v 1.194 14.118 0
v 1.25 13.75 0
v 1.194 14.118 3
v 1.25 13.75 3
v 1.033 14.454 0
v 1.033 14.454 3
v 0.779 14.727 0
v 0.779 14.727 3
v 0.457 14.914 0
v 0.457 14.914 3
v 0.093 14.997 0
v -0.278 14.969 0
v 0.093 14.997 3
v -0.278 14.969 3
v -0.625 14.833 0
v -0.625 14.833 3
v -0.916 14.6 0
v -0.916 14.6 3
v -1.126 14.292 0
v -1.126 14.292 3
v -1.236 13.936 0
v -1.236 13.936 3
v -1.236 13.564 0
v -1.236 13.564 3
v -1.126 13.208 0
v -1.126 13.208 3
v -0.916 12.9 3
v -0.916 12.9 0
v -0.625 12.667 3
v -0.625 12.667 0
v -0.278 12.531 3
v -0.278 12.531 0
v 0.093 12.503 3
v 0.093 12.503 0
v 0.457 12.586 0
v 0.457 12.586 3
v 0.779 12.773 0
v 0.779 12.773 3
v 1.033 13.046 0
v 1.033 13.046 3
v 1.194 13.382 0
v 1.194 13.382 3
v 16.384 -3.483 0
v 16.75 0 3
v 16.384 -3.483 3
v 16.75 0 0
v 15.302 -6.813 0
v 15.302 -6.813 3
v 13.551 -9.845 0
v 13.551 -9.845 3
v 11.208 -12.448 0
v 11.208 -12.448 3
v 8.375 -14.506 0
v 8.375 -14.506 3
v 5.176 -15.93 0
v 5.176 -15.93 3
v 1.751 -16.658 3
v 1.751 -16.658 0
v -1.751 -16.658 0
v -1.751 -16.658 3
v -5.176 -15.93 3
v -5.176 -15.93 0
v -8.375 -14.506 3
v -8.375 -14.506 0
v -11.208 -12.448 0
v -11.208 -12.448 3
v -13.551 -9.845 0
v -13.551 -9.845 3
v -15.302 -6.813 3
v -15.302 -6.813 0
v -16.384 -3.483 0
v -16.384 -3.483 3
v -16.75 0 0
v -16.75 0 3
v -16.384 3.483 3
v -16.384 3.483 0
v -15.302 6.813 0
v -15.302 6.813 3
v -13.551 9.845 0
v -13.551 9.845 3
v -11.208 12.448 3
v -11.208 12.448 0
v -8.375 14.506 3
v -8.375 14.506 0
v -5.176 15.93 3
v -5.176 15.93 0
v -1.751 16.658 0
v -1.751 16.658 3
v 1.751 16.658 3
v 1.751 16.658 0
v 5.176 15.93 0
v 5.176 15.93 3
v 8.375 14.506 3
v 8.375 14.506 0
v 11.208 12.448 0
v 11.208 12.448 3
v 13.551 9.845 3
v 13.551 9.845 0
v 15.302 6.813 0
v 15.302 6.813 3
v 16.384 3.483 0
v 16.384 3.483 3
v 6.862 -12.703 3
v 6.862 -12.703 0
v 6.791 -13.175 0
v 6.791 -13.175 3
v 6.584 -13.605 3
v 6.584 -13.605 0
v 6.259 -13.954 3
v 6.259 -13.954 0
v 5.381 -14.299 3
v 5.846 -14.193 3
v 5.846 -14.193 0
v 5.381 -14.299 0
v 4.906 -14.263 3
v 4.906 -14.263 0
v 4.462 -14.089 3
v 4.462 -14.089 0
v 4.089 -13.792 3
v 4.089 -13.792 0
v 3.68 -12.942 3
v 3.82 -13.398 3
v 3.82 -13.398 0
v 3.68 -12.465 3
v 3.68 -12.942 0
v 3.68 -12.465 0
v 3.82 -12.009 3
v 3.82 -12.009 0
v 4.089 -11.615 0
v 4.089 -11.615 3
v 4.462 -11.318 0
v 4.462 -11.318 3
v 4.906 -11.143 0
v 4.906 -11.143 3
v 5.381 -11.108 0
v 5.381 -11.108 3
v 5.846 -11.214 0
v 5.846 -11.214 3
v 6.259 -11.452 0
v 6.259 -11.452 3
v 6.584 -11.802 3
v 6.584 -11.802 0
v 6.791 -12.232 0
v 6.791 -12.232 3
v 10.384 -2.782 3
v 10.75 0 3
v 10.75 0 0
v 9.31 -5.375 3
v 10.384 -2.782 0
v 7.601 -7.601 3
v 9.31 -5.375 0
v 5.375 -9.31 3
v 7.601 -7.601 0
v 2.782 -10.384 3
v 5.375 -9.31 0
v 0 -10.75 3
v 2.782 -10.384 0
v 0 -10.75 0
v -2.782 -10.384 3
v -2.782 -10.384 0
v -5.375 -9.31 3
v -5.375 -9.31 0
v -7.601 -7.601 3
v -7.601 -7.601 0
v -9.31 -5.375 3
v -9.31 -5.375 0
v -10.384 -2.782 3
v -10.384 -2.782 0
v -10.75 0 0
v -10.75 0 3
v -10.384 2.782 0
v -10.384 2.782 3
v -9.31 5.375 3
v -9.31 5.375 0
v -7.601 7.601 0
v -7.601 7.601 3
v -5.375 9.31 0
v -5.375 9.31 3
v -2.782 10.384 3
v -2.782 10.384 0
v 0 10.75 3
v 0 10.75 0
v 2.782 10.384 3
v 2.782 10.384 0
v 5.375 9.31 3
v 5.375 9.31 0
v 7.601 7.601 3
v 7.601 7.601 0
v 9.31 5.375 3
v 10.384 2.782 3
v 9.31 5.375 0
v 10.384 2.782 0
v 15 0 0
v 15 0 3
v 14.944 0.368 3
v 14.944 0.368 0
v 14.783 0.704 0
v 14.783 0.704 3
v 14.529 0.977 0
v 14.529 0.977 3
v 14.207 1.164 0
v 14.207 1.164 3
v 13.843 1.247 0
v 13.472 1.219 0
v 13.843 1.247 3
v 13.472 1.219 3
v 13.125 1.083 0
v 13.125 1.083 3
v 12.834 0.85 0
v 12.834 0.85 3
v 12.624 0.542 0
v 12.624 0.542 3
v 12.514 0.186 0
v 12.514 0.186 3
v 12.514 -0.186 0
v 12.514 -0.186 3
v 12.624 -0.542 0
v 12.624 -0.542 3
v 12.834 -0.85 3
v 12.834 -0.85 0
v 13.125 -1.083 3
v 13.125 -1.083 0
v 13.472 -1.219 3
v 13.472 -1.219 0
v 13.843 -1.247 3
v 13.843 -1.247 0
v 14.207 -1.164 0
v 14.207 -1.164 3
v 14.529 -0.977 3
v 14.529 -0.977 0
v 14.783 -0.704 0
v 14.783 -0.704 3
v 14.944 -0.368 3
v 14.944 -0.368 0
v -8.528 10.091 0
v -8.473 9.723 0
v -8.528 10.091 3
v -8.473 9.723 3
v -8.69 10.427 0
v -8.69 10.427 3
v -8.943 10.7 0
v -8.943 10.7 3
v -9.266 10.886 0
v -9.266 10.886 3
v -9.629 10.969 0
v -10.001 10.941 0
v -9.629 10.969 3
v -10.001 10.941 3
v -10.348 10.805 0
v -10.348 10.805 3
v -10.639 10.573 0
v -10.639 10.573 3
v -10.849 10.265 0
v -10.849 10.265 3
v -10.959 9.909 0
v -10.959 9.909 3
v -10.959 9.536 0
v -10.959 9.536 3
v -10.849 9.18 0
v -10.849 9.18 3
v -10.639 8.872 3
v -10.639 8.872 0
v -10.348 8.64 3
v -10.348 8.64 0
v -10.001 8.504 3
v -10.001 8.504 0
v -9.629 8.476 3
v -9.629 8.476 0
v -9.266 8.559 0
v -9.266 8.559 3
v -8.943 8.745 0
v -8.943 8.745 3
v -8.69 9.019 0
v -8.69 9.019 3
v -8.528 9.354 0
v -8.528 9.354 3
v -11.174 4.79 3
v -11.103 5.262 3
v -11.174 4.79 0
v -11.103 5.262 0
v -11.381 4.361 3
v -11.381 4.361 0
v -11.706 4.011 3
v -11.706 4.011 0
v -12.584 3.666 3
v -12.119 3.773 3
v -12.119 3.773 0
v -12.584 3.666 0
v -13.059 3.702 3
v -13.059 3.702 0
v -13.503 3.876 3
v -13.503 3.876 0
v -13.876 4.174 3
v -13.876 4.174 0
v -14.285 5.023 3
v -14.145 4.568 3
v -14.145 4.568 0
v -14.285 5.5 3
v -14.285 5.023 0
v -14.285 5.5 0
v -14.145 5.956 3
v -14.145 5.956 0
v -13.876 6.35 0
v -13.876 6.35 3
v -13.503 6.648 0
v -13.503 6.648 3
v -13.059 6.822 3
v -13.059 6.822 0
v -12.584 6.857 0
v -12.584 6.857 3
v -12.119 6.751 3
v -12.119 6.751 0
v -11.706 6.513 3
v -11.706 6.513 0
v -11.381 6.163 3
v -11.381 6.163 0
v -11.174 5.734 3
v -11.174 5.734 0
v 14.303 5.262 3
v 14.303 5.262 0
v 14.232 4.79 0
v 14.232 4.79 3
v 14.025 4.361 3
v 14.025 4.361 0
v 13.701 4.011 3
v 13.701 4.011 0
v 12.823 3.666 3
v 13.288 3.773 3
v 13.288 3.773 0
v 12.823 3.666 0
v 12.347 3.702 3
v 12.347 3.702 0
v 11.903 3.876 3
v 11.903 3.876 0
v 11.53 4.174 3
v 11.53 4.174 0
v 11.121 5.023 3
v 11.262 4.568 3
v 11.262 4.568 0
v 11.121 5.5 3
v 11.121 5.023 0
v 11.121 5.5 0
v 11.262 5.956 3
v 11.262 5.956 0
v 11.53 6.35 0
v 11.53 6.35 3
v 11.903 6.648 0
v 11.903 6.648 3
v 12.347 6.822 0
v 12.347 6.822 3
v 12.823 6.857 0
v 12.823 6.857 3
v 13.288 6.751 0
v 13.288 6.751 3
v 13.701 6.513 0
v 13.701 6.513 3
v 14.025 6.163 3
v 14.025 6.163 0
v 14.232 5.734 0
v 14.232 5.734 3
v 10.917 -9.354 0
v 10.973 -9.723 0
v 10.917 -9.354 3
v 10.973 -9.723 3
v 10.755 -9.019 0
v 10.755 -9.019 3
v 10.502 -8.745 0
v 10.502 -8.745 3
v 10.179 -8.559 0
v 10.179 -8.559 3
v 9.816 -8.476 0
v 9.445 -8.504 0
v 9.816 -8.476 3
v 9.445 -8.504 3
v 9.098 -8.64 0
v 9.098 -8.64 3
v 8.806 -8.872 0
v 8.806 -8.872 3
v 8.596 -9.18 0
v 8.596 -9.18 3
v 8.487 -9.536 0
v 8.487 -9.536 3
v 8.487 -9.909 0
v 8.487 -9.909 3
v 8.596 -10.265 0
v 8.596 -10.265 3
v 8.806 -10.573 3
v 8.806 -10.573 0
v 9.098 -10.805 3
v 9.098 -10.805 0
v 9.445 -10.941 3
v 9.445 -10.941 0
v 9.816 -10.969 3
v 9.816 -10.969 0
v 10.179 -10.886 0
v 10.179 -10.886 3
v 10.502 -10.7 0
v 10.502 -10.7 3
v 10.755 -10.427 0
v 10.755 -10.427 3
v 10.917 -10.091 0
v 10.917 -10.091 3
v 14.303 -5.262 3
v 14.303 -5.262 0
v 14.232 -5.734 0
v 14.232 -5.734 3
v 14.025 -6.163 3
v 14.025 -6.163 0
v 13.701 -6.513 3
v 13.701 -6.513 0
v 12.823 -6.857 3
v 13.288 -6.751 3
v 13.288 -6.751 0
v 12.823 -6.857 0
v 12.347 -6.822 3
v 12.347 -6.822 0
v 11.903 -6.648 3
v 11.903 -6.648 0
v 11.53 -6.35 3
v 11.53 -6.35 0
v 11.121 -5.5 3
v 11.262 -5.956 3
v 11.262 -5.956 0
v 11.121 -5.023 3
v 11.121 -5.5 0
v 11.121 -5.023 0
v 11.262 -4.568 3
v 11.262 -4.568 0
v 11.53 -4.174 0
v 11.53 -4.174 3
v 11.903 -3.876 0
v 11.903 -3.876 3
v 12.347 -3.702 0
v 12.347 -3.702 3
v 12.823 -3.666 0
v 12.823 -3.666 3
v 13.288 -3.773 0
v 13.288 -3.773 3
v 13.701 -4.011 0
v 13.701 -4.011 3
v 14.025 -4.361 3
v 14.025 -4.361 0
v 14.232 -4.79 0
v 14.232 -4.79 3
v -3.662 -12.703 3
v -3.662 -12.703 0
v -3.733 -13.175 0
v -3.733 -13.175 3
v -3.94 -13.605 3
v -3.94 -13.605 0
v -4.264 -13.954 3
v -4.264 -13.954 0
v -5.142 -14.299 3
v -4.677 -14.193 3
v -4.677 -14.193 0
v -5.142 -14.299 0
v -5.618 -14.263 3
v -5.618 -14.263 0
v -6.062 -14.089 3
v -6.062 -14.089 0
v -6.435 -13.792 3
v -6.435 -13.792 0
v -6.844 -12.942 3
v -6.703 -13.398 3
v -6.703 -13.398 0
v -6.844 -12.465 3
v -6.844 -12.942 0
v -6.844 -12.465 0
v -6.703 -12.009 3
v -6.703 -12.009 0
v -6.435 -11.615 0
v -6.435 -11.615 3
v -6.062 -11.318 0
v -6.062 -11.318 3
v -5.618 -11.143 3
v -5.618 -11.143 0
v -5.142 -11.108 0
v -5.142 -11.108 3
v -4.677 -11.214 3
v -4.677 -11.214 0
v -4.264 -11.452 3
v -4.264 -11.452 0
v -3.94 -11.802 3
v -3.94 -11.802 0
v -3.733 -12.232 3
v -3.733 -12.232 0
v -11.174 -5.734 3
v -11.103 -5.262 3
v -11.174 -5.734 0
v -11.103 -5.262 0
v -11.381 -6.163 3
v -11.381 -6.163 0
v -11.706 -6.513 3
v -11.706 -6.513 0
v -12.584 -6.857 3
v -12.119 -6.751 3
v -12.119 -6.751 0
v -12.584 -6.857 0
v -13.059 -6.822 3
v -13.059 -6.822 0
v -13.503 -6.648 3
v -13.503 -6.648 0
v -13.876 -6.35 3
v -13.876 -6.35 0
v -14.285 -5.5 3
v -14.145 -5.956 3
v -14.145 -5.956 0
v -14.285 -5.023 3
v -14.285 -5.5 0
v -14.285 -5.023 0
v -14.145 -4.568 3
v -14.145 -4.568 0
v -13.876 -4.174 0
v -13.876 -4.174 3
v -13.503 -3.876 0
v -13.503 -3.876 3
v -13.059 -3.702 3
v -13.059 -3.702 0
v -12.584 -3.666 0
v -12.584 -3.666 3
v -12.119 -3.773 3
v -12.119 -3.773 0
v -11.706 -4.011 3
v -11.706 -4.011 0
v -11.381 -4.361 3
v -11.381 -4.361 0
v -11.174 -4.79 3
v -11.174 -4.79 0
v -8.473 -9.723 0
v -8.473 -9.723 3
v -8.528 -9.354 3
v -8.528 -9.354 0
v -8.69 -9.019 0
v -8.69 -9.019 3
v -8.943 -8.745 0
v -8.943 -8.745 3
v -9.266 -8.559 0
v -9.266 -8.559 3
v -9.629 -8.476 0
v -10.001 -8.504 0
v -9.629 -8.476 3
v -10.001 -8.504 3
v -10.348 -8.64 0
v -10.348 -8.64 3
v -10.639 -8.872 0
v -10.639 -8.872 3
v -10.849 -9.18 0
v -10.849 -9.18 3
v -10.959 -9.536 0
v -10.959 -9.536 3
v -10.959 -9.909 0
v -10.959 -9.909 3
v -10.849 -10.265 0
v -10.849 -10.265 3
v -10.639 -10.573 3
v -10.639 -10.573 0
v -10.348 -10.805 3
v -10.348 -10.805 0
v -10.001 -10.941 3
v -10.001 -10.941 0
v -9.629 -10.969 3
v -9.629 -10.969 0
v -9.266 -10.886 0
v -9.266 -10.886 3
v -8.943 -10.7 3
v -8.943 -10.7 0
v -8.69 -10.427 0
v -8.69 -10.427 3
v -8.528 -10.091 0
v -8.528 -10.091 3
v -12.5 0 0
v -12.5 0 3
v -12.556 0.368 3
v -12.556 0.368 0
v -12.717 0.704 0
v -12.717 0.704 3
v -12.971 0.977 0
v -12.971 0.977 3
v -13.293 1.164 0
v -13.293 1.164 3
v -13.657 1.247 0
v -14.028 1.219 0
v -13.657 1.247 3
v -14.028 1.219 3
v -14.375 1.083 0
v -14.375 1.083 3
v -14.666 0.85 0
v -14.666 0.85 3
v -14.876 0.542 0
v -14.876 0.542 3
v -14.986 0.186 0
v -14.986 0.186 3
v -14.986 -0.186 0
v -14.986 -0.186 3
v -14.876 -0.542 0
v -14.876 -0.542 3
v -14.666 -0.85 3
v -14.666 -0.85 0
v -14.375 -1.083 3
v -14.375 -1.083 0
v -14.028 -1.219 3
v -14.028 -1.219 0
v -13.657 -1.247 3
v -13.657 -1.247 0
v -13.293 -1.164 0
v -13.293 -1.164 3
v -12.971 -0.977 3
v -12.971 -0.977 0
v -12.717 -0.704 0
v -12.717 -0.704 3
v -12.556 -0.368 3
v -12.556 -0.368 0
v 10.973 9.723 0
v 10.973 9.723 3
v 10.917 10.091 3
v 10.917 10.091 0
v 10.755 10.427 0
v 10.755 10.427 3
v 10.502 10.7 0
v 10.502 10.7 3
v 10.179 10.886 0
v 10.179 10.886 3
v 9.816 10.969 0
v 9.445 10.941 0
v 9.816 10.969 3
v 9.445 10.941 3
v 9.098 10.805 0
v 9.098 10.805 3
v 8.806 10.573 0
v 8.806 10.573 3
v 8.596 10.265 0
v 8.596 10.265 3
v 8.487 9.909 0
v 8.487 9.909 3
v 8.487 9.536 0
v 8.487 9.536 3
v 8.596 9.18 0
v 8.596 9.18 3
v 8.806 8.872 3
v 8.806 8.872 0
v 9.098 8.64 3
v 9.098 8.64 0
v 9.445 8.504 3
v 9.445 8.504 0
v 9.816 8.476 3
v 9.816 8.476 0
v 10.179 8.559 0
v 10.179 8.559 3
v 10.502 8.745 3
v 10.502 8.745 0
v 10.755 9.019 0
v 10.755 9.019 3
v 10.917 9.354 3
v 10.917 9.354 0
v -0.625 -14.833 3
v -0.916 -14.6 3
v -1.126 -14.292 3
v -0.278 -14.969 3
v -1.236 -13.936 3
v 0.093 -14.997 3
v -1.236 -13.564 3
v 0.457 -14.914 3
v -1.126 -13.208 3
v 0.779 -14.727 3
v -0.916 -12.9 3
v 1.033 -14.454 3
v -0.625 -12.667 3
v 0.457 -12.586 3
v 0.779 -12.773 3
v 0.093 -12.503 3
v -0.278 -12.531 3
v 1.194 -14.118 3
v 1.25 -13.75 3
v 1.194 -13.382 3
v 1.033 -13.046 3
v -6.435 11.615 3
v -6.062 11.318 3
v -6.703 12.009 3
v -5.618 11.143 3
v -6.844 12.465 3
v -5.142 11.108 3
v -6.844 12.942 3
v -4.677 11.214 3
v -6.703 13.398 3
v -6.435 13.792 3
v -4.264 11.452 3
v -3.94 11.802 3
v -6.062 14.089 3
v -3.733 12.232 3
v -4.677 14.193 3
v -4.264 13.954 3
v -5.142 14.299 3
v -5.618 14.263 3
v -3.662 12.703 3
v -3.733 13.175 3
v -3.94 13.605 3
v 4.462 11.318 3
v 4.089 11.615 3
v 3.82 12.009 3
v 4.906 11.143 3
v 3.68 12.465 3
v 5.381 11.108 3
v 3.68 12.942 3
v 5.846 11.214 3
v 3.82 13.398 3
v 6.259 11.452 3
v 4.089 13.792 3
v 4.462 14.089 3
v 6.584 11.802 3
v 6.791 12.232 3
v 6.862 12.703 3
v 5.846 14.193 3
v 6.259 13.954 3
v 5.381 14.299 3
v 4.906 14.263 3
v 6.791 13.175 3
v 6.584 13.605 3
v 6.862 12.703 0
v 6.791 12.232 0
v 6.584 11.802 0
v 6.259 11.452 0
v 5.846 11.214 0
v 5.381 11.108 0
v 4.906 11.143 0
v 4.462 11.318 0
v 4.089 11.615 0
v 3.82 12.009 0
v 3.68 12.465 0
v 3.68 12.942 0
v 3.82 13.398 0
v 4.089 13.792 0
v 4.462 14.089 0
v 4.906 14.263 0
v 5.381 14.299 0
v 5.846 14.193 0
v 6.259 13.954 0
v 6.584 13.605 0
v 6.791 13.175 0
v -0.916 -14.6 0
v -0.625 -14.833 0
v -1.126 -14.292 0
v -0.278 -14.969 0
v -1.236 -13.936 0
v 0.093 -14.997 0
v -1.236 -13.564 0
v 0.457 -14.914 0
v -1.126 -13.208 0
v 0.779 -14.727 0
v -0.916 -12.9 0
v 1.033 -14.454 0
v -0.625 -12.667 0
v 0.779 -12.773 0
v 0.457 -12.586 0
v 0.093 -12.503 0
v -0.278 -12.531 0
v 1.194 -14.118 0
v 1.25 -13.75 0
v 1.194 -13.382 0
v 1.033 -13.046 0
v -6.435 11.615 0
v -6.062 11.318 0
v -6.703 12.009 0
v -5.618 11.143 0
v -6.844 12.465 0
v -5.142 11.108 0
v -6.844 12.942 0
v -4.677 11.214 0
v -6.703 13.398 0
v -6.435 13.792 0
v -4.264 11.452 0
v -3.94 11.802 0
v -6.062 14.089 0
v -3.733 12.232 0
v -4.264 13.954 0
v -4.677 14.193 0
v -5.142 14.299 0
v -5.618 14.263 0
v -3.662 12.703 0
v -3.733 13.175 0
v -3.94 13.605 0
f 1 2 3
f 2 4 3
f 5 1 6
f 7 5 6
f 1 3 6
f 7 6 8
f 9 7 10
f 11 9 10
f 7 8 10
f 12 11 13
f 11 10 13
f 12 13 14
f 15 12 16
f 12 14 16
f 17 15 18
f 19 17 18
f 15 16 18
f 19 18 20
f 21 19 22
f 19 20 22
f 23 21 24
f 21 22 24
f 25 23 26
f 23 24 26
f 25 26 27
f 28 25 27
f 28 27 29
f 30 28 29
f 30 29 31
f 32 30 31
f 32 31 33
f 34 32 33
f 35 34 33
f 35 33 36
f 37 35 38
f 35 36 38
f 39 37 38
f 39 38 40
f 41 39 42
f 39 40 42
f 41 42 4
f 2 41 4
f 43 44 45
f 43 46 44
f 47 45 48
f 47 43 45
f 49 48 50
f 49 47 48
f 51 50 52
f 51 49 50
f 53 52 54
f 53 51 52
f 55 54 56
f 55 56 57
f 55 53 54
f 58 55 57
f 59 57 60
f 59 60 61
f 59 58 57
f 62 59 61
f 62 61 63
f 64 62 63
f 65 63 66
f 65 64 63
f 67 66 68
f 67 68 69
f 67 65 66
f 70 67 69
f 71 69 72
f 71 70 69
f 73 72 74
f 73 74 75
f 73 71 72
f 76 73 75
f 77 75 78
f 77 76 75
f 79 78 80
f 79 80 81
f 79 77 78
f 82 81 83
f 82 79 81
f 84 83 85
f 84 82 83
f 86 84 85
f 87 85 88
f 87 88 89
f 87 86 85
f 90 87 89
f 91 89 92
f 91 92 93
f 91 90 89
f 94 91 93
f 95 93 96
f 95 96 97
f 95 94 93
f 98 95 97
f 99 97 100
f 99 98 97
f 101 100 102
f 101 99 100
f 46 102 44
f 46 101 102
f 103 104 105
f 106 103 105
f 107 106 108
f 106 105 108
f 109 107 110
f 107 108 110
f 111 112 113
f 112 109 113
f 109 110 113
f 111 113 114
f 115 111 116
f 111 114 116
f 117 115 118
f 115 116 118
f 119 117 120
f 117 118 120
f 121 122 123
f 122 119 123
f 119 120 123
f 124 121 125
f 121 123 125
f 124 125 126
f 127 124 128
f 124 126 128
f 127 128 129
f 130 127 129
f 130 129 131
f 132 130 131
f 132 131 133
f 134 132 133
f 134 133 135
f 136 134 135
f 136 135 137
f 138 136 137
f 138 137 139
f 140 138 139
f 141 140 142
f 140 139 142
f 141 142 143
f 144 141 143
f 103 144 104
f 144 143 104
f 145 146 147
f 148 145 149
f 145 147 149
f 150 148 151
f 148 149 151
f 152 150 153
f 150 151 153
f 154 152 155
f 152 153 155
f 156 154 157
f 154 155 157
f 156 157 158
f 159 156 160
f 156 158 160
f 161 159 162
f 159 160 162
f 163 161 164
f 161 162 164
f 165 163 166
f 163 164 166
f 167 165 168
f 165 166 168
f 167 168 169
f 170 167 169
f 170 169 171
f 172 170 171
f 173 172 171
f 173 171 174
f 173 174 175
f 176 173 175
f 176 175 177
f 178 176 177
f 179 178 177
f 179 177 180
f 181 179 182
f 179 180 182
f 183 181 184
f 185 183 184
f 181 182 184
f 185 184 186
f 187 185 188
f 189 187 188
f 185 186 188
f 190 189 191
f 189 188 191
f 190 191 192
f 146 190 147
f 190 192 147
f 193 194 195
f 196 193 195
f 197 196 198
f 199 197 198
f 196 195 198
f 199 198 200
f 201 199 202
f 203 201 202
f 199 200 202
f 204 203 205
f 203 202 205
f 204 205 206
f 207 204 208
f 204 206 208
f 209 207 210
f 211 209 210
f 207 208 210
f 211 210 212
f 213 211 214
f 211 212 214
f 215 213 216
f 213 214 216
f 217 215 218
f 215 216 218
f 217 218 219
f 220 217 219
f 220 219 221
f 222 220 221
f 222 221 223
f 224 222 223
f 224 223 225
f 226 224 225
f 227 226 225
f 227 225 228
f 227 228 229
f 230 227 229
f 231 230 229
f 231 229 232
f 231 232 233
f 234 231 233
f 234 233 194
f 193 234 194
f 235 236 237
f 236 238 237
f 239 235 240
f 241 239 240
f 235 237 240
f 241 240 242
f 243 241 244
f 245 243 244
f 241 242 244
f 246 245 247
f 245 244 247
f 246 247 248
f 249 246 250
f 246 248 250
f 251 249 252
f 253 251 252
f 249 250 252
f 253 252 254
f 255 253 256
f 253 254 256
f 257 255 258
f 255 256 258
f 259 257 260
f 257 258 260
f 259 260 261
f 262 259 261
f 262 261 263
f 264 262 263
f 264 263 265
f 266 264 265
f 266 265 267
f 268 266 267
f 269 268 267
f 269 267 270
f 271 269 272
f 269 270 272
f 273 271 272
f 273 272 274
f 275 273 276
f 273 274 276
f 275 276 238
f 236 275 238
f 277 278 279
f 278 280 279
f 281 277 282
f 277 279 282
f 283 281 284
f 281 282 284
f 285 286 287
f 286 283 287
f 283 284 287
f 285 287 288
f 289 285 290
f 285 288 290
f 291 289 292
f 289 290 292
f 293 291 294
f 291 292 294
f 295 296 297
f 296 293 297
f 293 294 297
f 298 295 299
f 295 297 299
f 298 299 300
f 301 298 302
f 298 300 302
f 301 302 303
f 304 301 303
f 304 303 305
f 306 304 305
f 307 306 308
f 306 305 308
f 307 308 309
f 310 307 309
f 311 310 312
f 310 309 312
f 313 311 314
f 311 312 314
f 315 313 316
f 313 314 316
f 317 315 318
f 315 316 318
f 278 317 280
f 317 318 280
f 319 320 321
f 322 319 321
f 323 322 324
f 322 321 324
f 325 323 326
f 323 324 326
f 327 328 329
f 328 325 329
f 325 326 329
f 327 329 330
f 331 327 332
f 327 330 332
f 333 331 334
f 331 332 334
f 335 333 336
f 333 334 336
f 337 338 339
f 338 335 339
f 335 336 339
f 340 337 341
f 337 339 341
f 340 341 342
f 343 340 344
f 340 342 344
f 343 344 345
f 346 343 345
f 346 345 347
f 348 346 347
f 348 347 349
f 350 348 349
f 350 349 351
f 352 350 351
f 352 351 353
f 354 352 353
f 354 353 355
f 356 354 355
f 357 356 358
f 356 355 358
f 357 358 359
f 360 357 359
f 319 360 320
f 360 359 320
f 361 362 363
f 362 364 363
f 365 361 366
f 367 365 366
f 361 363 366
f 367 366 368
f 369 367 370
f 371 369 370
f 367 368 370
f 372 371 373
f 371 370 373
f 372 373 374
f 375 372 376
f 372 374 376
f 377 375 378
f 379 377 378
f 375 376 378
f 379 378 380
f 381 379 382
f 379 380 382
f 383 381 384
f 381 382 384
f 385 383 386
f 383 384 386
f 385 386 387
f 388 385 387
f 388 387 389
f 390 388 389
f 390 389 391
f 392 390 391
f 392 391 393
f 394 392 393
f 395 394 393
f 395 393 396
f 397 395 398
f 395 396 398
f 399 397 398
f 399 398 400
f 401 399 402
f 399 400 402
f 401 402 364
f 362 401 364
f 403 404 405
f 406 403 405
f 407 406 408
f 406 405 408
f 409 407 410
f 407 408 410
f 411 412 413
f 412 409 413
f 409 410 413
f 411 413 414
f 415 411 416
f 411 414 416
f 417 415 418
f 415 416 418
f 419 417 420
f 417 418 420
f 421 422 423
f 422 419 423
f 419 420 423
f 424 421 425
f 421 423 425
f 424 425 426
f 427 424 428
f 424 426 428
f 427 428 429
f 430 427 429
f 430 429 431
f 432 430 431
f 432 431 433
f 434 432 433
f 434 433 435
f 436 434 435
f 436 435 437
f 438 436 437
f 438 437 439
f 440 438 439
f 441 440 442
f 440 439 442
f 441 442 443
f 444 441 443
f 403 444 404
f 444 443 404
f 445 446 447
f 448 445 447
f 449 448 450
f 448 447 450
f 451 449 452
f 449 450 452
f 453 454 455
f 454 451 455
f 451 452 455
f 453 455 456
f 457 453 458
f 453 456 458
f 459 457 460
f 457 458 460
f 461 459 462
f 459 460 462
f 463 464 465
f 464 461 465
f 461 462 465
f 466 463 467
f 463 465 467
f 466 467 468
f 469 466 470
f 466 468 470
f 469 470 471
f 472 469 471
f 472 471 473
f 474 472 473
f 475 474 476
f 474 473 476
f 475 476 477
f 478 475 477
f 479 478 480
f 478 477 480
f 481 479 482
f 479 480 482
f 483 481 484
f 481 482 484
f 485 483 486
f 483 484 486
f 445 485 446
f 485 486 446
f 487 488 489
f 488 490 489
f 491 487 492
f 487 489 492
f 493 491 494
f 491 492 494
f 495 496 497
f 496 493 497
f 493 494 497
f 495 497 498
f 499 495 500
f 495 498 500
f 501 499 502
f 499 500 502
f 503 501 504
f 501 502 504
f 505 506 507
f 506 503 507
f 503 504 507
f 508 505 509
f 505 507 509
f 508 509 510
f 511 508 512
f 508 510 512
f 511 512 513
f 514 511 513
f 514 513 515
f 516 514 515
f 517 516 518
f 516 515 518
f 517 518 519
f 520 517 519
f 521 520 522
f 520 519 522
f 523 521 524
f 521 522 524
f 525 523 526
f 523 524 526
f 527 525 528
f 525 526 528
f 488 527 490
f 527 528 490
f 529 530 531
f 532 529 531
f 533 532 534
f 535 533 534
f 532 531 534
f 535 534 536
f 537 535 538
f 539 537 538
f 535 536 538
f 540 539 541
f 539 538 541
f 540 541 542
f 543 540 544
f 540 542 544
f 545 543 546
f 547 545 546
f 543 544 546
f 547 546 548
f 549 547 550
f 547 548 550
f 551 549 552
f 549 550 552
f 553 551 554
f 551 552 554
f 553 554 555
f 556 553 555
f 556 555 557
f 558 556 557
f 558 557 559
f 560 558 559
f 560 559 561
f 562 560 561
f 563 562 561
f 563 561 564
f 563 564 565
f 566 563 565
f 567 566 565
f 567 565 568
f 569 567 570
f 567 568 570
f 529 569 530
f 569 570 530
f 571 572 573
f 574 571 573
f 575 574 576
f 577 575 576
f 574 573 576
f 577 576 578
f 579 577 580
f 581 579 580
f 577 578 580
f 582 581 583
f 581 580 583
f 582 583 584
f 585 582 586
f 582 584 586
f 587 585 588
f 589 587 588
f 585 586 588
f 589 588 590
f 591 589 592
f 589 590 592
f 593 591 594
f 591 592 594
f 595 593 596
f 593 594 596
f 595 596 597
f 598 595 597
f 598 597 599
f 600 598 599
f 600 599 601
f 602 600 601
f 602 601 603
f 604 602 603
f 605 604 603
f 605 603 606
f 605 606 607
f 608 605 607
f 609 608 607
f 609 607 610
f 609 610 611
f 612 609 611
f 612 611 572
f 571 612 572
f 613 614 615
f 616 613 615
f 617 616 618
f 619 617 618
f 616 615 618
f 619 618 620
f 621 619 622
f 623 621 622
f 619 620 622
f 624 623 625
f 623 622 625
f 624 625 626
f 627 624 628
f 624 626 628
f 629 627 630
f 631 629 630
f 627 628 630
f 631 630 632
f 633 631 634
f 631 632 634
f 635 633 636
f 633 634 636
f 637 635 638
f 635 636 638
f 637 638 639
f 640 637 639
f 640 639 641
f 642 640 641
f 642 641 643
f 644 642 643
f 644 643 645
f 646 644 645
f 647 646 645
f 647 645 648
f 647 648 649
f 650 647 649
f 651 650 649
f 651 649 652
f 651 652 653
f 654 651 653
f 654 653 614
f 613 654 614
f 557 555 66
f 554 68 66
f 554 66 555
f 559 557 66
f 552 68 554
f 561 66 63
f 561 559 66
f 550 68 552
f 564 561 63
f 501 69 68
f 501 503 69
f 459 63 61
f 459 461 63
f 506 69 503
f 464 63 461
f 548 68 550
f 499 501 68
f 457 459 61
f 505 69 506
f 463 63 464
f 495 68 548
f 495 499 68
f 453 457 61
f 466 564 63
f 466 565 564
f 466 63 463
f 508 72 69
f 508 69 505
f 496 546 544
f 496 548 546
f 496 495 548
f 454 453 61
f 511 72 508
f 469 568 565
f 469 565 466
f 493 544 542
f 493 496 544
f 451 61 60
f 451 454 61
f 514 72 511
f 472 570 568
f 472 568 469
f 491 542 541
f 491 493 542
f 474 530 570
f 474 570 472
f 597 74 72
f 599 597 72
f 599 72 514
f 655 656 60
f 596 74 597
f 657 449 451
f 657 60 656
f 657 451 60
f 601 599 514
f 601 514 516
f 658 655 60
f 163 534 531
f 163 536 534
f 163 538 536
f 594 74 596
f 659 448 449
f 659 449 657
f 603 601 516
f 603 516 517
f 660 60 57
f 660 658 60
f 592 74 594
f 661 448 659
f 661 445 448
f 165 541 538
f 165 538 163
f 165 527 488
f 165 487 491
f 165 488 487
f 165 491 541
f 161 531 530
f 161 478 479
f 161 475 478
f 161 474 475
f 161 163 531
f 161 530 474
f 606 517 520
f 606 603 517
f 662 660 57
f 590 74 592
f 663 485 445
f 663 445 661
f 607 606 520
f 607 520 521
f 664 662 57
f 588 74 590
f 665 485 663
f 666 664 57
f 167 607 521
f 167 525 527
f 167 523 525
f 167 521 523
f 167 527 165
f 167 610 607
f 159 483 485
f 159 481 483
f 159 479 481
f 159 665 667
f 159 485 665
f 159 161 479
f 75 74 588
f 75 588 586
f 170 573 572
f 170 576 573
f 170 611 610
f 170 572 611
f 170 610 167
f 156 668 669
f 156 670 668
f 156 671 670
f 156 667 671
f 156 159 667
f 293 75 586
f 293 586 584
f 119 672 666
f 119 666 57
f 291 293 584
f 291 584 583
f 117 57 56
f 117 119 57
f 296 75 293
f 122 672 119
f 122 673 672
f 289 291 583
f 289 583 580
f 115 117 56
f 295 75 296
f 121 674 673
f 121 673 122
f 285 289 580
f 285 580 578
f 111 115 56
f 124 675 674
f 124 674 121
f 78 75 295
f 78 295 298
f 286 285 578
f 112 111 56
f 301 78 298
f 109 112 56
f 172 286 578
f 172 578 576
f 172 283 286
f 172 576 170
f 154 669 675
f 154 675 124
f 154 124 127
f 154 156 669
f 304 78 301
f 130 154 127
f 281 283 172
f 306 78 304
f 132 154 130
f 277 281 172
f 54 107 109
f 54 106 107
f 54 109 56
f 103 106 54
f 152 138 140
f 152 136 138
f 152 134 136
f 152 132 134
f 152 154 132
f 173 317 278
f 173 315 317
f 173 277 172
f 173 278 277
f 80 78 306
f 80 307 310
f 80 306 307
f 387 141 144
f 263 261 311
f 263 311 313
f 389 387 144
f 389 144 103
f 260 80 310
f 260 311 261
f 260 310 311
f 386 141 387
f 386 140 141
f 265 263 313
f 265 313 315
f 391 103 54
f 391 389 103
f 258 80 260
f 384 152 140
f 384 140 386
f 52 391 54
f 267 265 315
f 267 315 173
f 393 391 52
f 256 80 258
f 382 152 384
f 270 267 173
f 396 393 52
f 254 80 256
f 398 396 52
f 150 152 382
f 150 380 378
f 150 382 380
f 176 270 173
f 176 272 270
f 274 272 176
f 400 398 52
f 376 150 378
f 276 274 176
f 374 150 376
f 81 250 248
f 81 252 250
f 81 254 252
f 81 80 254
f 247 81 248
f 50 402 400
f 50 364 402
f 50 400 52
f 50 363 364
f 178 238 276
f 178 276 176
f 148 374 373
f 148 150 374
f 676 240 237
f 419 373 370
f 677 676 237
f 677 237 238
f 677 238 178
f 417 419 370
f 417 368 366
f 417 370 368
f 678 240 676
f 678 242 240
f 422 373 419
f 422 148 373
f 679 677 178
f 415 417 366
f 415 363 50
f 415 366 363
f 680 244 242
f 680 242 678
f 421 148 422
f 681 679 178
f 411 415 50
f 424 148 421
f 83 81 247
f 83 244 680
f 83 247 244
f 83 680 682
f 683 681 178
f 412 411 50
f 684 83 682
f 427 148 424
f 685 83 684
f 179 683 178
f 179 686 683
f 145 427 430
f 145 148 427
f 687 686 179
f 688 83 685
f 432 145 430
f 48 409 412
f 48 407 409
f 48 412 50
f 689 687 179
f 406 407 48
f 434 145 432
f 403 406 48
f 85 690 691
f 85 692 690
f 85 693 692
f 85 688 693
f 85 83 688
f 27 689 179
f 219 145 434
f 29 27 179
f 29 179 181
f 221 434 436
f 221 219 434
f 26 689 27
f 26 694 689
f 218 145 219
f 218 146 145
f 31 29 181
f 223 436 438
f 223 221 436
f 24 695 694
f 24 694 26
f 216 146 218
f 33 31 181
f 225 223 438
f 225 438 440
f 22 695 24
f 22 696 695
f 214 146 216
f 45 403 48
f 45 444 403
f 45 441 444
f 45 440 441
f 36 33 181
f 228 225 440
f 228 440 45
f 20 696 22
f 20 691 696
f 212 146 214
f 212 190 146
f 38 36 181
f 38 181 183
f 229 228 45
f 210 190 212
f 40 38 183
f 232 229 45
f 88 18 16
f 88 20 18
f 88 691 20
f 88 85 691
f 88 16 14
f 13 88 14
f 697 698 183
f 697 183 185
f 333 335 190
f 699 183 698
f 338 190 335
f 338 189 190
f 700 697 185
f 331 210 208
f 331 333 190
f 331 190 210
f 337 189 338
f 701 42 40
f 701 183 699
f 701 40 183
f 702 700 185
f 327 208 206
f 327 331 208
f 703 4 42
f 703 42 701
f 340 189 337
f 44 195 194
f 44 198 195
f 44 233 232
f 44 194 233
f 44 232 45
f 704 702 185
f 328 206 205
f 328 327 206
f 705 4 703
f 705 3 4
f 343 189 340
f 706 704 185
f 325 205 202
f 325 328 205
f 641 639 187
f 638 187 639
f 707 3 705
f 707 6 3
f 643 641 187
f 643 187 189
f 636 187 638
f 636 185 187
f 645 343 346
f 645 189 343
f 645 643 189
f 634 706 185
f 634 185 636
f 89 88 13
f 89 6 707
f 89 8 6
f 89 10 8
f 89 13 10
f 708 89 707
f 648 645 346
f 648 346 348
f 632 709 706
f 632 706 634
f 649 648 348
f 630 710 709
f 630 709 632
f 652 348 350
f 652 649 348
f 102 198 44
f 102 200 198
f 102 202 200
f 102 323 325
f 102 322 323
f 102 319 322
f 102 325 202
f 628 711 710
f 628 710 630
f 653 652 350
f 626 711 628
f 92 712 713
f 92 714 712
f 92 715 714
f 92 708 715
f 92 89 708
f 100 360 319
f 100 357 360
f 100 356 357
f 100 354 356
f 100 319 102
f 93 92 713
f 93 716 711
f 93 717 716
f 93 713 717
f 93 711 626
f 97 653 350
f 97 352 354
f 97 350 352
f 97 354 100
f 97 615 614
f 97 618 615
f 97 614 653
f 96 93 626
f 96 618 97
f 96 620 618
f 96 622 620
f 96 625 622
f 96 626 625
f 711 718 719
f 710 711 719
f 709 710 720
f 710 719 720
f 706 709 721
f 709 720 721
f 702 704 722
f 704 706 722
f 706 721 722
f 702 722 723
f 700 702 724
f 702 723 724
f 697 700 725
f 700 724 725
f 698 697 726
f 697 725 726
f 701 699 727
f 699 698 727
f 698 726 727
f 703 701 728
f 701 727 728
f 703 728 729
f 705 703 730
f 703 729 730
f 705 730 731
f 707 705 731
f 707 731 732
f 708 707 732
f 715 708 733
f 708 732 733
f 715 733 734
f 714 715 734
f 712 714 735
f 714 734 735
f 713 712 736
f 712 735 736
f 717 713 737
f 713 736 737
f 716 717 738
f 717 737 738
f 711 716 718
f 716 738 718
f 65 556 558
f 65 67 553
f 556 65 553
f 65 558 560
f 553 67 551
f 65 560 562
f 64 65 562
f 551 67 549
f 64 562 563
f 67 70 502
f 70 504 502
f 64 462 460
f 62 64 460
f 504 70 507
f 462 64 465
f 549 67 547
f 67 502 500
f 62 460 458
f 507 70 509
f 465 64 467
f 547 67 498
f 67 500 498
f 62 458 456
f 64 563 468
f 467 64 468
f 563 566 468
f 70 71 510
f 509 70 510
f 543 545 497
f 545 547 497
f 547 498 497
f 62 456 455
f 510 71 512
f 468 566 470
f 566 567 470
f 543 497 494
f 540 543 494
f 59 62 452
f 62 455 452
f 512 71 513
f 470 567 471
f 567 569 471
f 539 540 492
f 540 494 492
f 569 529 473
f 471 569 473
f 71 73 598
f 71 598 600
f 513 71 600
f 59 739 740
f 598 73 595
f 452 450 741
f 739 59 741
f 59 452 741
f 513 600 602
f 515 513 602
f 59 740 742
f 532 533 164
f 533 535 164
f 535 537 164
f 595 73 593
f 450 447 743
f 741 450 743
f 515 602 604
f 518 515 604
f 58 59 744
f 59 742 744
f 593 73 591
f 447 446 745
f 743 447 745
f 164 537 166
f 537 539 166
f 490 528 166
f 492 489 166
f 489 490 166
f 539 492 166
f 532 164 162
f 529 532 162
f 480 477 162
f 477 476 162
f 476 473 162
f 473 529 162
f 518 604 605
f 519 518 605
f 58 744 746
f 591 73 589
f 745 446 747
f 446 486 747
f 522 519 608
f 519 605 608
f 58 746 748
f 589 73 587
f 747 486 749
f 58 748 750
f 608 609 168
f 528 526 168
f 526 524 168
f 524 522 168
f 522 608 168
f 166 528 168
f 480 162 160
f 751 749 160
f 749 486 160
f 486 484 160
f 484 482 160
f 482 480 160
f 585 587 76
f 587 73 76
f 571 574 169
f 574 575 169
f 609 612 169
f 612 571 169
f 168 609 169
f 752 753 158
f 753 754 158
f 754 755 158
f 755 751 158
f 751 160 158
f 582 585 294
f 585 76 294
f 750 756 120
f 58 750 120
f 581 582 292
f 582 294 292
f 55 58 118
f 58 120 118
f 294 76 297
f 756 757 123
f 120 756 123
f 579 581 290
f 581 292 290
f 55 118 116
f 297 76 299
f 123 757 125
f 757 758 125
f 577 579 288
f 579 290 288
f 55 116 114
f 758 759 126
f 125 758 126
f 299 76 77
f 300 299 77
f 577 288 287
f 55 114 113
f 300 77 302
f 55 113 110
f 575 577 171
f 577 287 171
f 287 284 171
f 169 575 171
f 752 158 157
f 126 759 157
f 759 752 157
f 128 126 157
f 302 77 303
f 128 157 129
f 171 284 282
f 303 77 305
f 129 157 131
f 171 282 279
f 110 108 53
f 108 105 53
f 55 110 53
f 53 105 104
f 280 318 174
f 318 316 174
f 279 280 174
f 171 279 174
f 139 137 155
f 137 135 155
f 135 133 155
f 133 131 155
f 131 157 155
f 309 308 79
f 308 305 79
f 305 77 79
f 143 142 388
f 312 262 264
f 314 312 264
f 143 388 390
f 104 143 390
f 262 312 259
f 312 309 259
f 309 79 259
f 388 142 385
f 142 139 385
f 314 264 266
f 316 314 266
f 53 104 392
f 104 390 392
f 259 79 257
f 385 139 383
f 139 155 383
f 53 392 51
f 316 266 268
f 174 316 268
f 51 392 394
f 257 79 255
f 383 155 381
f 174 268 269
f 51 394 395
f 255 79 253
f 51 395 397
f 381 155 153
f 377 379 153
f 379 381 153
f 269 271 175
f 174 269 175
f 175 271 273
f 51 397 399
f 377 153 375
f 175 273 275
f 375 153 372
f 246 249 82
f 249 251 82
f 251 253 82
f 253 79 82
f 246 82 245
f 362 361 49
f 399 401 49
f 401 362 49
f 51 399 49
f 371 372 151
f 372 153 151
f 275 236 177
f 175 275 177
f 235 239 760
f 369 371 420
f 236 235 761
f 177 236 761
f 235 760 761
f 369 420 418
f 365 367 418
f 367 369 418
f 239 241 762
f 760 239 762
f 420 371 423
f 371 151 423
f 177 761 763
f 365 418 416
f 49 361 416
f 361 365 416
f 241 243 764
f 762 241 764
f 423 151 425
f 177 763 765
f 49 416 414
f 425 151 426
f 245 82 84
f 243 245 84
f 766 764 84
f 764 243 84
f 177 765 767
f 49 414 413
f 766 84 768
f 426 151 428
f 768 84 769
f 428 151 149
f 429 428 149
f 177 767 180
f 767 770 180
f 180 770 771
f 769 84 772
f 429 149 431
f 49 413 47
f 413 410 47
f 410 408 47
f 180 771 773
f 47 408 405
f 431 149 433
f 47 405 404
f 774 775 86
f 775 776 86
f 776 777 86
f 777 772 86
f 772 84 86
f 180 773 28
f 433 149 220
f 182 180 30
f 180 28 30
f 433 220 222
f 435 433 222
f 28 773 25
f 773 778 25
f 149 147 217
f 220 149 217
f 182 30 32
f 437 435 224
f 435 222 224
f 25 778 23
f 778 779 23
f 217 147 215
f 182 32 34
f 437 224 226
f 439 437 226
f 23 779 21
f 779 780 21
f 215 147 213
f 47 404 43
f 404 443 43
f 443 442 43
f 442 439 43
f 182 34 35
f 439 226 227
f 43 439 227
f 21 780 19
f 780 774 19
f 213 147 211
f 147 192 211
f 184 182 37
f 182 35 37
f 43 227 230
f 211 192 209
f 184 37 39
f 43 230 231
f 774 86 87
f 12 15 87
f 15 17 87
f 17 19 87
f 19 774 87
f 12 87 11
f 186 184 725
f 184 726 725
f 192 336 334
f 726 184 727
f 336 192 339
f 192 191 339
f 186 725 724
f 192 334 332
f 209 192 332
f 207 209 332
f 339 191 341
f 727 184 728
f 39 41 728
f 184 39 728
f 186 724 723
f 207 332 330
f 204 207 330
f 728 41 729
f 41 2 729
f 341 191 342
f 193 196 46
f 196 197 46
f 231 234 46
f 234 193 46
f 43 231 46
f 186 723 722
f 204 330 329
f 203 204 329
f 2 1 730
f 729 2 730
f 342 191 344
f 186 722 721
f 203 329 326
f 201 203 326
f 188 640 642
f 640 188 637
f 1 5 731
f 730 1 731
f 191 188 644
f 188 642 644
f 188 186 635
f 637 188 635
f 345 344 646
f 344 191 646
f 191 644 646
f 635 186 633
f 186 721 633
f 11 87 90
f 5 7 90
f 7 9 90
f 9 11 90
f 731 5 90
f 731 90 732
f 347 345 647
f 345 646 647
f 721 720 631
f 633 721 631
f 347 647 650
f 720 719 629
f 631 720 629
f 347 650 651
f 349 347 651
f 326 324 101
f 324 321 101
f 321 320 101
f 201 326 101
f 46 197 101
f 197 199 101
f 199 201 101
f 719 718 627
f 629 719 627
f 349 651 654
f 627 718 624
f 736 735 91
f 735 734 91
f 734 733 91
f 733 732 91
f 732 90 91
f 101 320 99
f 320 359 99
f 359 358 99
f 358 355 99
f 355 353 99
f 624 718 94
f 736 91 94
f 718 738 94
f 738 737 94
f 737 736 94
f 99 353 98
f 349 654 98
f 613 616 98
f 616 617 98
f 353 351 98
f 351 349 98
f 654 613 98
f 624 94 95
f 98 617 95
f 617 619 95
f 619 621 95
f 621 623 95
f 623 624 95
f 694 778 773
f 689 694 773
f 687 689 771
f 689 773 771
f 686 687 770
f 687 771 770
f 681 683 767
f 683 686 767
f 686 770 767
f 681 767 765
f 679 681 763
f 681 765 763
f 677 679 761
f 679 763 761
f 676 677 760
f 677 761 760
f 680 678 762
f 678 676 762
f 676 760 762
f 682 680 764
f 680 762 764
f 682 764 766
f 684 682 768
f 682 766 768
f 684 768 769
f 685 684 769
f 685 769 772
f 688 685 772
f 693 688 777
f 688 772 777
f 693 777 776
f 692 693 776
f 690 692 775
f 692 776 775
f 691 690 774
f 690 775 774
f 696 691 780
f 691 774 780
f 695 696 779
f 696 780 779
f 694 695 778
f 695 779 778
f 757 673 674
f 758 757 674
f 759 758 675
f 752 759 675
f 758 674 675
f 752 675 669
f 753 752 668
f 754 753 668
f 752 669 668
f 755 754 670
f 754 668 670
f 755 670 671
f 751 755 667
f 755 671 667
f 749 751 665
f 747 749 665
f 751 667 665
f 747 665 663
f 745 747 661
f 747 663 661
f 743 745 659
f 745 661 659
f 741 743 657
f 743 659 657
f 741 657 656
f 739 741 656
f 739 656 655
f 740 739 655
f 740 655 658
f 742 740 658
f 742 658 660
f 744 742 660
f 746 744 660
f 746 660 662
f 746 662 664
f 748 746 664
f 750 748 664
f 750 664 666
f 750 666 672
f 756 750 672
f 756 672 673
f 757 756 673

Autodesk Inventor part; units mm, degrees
ref_plane "YZ Plane" through (0, 0, 0) normal (1, 0, 0) x (0, 1, 0)
ref_plane "XZ Plane" through (0, 0, 0) normal (0, 1, 0) x (-1, 0, 0)
ref_plane "XY Plane" through (0, 0, 0) normal (0, 0, 1) x (1, 0, 0)
sketch "スケッチ1" plane through (0, 0, 0) normal (0, 0, 1) x (1, 0, 0)
  circle A0 centre (0, 0) radius 15.5 construction
  circle A1 centre (-16.7262, 17.2115) radius 1.6 projected
  circle A2 centre (0.3431, 23.9975) radius 1.6 projected
  circle A3 centre (17.2115, 16.7262) radius 1.6 projected
  circle A4 centre (23.9975, -0.3431) radius 1.6 projected
  circle A5 centre (16.7262, -17.2115) radius 1.6 projected
  circle A6 centre (-0.3431, -23.9975) radius 1.6 projected
  circle A7 centre (-17.2115, -16.7262) radius 1.6 projected
  circle A8 centre (-23.9975, 0.3431) radius 1.6 projected
  circle A9 centre (0, 0) radius 27.5 projected
  circle A10 centre (0, 0) radius 5.1 projected
  circle A11 centre (4.9497, -4.9497) radius 1.1 projected
  circle A12 centre (7, 0) radius 1.1 projected
  circle A13 centre (4.9497, 4.9497) radius 1.1 projected
  circle A14 centre (0, 7) radius 1.1 projected
  circle A15 centre (-4.9497, 4.9497) radius 1.1 projected
  circle A16 centre (-7, 0) radius 1.1 projected
  circle A17 centre (-4.9497, -4.9497) radius 1.1 projected
  circle A18 centre (0, -7) radius 1.1 projected
  circle A19 centre (0, 0) radius 20.5 projected
  circle A20 centre (0, 0) radius 10.75
  line L0 (0, 0) -> (13.125, 0) construction
  line L1 (9.2808, -9.2808) -> (0, 0) construction
  line L2 (0, 0) -> (12.7033, -5.2619) construction
  circle A21 centre (12.7033, -5.2619) radius 1.6
  circle A22 centre (0, 0) radius 16.75
  line L3 (0, 0) -> (0, -8.1)
  line L4 (0, -10.75) -> (0, -16.75)
  circle A23 centre (0, 0) radius 13.75 construction
  circle A24 centre (12.7033, 5.2619) radius 1.6
  circle A25 centre (0, 0) radius 13.75 construction
  circle A26 centre (5.2619, 12.7033) radius 1.6
  circle A27 centre (0, 0) radius 13.75 construction
  circle A28 centre (-5.2619, 12.7033) radius 1.6
  circle A29 centre (0, 0) radius 13.75 construction
  circle A30 centre (-12.7033, 5.2619) radius 1.6
  circle A31 centre (0, 0) radius 13.75 construction
  circle A32 centre (-12.7033, -5.2619) radius 1.6
  circle A33 centre (0, 0) radius 13.75 construction
  circle A34 centre (-5.2619, -12.7033) radius 1.6
  circle A35 centre (0, 0) radius 13.75 construction
  circle A36 centre (5.2619, -12.7033) radius 1.6
  circle A37 centre (0, 0) radius 13.75 construction
  dimension "d14" = 21.5
  dimension "d15" = 33.5
  dimension "d0" = 13.75
  dimension "d1" = 22.5
  dimension "d2" = 3.2
  dimension "d18" = 27.5
  dimension "d21" = 360
extrude "押し出し3" add sketch "スケッチ1" along normal blind 3 contours A22
sketch "スケッチ2" plane through (0, 0, 3) normal (0, 0, 1) x (1, 0, 0)
  circle A0 centre (0, 0) radius 16.75
  circle A1 centre (5.2619, -12.7033) radius 1.6 projected
  circle A2 centre (0, 0) radius 13.75 construction
  line L0 (0, 0) -> (5.2619, -12.7033)
  line L1 (0, 0) -> (-5.2619, -12.7033)
  line L2 (0, -13.75) -> (0, 0) construction
  circle A3 centre (0, -13.75) radius 1.25
  circle A4 centre (9.7227, -9.7227) radius 1.25
  circle A5 centre (13.75, 0) radius 1.25
  circle A6 centre (9.7227, 9.7227) radius 1.25
  circle A7 centre (0, 13.75) radius 1.25
  circle A8 centre (-9.7227, 9.7227) radius 1.25
  circle A9 centre (-13.75, 0) radius 1.25
  circle A10 centre (-9.7227, -9.7227) radius 1.25
  dimension "d25" = 2.5
  dimension "d28" = 360
extrude "押し出し4" cut sketch "スケッチ2" against normal through all contours A3 | A4 | A5 | A6 | A7 | A8 | A9 | A10
properties part number "出力部品B_ダブルスラスト用(t2_アルミ)" material "アルミニウム 6061"
